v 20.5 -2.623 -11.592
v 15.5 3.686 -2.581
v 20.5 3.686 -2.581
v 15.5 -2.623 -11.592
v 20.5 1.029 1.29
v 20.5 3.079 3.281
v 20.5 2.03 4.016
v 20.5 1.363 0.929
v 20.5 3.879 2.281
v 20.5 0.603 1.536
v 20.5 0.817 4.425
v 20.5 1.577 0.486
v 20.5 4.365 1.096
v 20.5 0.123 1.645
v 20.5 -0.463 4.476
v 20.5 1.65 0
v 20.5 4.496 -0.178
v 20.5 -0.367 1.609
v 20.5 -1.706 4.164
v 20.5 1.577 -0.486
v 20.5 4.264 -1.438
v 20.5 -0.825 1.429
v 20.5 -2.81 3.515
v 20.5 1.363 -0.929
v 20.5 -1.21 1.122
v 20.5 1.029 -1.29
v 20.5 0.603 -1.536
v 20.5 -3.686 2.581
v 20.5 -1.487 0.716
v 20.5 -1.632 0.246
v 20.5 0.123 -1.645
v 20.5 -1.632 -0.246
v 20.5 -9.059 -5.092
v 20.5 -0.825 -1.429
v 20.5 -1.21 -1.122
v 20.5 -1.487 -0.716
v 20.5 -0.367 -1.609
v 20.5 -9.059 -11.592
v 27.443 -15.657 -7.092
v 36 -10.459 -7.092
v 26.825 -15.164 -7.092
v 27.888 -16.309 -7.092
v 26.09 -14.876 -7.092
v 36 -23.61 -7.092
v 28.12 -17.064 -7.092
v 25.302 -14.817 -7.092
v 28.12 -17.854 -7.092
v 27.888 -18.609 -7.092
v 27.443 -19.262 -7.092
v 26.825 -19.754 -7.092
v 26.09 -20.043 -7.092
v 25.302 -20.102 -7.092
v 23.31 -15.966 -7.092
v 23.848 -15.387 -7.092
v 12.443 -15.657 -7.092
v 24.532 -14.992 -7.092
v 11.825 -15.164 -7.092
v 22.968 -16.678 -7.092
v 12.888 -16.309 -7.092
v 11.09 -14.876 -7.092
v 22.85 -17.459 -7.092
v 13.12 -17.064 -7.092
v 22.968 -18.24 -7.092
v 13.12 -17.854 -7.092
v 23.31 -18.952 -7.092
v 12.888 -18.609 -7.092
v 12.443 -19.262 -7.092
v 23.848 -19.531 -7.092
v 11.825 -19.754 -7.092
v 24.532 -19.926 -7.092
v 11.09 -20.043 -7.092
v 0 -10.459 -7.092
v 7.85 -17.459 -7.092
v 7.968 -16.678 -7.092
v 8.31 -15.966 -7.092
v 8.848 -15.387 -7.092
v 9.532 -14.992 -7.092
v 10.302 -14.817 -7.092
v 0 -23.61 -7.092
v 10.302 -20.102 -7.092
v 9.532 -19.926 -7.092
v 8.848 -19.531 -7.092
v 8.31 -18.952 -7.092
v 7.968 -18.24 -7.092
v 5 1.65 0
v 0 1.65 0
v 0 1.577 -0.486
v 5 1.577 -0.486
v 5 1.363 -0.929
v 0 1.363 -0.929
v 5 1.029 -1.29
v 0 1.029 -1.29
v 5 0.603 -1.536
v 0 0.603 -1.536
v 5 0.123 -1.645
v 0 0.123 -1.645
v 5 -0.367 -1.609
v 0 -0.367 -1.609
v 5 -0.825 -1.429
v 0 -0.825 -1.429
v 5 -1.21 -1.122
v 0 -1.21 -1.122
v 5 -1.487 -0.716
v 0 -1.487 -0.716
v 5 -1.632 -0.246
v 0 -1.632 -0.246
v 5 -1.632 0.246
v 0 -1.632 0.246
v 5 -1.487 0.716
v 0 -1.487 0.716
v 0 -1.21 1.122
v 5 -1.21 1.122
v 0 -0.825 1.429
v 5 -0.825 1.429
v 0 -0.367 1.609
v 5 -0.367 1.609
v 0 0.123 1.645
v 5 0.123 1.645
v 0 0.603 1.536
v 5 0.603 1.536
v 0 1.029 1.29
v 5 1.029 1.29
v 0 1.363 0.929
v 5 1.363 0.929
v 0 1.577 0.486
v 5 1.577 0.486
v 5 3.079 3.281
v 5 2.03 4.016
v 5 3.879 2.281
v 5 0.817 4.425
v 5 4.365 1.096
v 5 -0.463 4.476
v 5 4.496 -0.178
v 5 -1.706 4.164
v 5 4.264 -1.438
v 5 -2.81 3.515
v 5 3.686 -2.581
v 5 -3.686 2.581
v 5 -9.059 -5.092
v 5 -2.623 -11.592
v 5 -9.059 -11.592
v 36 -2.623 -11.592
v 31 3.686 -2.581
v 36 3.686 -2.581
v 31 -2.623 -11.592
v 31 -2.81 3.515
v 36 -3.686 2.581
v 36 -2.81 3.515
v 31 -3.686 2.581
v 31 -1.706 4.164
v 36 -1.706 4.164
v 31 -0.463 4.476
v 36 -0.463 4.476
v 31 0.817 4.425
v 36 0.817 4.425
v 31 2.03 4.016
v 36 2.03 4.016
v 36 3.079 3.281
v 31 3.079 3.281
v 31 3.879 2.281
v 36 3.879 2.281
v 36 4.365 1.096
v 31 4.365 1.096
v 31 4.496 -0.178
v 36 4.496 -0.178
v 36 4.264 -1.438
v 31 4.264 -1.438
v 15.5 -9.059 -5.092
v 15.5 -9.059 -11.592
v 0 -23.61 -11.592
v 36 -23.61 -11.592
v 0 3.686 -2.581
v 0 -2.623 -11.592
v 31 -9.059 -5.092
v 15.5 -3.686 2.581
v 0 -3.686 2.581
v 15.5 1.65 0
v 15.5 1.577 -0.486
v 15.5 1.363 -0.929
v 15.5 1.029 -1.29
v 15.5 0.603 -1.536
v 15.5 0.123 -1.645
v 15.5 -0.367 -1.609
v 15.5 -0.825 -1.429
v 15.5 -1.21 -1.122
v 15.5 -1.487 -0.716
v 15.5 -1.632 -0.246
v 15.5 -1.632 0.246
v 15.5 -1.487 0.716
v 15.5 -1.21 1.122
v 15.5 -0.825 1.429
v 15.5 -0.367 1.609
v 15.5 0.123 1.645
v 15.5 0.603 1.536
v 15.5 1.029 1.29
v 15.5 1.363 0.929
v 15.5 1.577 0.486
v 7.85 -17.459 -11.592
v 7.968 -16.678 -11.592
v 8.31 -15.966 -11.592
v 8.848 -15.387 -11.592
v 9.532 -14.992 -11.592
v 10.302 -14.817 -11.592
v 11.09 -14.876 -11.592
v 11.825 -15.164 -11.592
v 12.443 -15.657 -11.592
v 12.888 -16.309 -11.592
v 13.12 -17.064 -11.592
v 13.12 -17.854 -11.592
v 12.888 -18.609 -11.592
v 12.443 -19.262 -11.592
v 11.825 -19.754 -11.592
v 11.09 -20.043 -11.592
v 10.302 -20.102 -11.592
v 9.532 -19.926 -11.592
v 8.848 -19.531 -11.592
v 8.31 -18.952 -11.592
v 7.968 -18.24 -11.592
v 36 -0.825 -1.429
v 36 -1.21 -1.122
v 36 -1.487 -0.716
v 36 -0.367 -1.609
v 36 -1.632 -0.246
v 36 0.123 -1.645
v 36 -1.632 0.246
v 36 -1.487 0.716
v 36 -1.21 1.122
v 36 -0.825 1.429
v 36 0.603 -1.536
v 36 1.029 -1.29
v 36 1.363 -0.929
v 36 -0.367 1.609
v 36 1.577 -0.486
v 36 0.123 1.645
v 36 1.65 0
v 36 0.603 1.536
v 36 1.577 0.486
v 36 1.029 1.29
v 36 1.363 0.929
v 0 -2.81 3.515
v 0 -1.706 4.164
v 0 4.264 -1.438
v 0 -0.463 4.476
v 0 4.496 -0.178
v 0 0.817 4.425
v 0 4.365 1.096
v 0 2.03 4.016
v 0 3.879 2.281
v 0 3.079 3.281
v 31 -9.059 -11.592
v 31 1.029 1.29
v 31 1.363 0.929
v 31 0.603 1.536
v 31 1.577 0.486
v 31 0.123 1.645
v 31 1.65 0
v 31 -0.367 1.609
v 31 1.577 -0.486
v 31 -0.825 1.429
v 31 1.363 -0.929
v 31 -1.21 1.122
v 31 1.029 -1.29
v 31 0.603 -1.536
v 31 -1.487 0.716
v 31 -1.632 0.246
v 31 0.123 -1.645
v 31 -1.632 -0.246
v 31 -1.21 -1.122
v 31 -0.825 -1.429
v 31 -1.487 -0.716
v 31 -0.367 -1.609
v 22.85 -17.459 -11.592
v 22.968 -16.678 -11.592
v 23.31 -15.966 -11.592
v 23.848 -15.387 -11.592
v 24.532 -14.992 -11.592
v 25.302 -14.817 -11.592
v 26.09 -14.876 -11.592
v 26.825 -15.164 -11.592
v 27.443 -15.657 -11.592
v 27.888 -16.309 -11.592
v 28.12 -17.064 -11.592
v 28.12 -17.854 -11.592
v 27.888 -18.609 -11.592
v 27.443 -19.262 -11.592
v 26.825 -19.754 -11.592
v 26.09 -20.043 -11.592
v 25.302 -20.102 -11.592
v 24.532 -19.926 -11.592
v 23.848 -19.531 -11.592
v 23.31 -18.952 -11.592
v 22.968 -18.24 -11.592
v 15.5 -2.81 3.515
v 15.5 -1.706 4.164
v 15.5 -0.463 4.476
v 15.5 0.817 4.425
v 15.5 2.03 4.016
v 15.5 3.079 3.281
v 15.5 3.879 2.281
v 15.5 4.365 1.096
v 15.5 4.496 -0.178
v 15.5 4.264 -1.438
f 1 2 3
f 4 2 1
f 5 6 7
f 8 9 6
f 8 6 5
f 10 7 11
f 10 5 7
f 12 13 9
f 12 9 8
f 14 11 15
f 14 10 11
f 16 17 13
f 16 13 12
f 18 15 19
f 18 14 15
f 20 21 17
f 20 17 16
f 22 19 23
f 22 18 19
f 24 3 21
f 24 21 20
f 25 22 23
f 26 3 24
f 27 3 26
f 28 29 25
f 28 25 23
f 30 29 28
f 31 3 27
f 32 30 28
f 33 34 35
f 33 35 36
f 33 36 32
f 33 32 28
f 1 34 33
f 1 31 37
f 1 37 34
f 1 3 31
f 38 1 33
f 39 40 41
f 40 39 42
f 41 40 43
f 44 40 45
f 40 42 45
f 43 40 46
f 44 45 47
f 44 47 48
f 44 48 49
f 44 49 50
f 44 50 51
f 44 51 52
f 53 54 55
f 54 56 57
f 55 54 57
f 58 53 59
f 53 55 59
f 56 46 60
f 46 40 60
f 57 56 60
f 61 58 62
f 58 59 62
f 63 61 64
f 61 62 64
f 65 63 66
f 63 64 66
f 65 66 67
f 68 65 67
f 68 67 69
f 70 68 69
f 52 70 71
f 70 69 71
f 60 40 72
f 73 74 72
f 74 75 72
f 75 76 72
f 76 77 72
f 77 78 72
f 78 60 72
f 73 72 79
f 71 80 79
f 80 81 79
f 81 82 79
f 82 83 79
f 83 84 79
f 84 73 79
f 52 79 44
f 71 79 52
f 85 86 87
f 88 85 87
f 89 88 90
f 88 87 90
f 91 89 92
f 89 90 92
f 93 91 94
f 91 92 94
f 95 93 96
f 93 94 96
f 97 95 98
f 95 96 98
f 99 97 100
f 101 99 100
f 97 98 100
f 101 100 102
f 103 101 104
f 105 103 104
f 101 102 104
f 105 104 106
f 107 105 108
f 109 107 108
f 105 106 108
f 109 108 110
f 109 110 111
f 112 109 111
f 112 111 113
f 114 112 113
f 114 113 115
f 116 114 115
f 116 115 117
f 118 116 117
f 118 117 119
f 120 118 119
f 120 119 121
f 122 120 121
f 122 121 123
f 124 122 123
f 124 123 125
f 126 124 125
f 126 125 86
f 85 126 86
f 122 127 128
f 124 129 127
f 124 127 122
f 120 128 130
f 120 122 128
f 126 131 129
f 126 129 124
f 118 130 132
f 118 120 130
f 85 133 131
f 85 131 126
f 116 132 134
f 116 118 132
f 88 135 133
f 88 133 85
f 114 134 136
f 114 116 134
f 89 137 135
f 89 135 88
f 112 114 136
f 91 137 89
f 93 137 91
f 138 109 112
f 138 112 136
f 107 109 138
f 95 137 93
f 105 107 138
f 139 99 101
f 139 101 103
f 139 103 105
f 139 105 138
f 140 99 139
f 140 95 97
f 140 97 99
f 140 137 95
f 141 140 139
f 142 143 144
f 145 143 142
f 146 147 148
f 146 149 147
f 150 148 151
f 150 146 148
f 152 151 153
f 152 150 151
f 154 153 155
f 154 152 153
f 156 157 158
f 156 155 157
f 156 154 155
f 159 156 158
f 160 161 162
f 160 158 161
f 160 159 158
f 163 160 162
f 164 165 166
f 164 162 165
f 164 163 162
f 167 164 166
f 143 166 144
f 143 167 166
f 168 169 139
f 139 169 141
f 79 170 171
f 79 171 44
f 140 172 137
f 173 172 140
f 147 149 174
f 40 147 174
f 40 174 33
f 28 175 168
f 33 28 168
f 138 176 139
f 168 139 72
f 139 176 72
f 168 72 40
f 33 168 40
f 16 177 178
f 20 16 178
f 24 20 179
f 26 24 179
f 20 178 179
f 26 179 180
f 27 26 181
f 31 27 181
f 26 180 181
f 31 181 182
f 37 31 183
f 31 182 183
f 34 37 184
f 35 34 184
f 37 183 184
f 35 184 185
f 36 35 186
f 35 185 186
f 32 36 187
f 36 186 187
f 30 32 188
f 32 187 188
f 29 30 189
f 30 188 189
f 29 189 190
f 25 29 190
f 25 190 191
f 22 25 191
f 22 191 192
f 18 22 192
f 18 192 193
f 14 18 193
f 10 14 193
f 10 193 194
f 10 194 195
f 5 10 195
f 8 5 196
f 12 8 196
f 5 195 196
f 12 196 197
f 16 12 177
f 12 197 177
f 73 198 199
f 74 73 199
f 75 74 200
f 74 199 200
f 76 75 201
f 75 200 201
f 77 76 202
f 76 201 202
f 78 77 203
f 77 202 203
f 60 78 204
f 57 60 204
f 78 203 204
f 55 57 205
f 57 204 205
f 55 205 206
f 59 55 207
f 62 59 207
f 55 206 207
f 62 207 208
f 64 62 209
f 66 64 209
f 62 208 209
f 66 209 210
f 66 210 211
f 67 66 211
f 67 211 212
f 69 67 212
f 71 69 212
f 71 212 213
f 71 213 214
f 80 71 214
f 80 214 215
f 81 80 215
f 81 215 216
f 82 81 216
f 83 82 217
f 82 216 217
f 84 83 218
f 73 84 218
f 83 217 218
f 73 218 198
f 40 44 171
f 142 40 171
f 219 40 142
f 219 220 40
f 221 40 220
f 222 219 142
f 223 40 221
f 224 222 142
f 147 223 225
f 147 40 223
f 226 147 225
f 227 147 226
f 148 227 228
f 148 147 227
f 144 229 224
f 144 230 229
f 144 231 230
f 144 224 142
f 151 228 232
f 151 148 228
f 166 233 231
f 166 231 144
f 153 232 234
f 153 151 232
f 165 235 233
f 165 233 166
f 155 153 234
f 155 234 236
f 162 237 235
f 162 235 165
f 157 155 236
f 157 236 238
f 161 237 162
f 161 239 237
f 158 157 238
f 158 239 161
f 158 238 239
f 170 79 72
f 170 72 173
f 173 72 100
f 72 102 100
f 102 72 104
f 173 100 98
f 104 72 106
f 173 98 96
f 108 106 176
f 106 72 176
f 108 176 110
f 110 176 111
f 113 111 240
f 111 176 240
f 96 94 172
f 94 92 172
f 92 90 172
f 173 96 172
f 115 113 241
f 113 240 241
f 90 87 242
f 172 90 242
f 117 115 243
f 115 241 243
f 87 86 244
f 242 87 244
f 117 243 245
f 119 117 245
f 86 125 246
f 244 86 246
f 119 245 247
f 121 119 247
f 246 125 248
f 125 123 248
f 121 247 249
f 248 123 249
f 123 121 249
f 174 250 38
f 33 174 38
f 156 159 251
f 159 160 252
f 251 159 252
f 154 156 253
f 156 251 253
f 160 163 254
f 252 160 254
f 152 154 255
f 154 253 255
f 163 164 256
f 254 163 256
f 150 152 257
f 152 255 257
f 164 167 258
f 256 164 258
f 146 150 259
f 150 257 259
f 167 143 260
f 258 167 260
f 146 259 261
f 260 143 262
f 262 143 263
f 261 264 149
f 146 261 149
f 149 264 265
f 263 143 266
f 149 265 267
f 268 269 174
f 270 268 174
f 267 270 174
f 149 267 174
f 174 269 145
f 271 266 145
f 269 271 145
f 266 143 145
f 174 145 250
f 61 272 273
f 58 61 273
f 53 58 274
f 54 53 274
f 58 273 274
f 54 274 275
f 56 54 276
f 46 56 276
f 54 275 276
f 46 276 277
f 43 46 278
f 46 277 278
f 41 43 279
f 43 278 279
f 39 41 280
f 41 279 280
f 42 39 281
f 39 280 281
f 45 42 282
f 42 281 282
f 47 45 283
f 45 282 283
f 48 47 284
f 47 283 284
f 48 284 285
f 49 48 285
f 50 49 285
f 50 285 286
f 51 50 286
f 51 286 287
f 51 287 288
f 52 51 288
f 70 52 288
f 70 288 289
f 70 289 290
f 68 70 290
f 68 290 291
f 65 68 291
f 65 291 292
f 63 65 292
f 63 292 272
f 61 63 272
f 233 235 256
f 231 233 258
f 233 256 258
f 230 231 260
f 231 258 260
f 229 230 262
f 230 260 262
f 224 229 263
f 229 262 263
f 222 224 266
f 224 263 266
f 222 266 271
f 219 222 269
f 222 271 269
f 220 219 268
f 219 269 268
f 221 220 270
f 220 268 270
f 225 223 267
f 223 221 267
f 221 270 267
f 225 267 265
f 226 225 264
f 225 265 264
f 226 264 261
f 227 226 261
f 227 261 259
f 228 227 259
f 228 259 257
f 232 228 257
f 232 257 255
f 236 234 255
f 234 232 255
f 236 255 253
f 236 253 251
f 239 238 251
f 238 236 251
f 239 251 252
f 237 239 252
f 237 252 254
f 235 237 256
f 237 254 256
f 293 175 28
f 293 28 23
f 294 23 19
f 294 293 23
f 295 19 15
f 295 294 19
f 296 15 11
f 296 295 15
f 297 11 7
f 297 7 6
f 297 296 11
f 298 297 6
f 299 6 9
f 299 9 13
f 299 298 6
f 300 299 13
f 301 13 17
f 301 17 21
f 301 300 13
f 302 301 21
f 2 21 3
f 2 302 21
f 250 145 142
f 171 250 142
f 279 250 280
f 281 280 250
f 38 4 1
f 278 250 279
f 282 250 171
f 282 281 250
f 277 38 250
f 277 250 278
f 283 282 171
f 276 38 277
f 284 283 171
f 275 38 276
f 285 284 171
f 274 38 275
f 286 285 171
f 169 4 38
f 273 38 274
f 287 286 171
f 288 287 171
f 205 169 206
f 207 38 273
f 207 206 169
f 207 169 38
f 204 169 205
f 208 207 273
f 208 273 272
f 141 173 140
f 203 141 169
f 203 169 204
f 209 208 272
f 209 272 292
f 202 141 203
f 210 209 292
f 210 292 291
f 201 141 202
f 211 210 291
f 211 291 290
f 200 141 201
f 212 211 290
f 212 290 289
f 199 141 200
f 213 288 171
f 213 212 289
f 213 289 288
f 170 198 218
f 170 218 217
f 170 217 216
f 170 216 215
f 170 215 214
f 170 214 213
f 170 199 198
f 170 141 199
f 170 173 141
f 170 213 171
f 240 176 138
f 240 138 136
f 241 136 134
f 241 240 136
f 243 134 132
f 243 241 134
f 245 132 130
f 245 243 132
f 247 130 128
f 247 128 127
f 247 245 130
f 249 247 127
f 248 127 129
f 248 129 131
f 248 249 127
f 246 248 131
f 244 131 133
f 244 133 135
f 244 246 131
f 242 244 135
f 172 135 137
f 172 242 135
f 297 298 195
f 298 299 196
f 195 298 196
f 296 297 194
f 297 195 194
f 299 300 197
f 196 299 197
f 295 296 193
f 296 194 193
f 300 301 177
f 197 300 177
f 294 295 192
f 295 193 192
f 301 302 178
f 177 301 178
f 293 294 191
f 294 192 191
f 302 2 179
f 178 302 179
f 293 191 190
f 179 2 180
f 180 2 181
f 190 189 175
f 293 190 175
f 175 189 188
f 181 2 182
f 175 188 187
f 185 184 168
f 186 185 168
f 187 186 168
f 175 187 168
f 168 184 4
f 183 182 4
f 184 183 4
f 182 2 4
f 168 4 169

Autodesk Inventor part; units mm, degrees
ref_plane "YZ Plane" through (0, 0, 0) normal (1, 0, 0) x (0, 1, 0)
ref_plane "XZ Plane" through (0, 0, 0) normal (0, 1, 0) x (-1, 0, 0)
ref_plane "XY Plane" through (0, 0, 0) normal (0, 0, 1) x (1, 0, 0)
sketch "스케치1" plane through (0, 0, 0) normal (1, 0, 0) x (0, 1, 0)
  circle A0 centre (0, 0) radius 1.65
  line L0 (-23.6101, -11.5918) -> (-23.6101, -7.0918)
  arc A1 (3.6862, -2.5811) -> (-3.6862, 2.5811) centre (0, 0) ccw
  line L1 (-3.6862, 2.5811) -> (-10.4592, -7.0918)
  line L2 (-10.4592, -7.0918) -> (-23.6101, -7.0918)
  line L3 (3.6862, -2.5811) -> (-2.6232, -11.5918)
  line L4 (-2.6232, -11.5918) -> (-23.6101, -11.5918)
  line L5 (-10.4592, -7.0918) -> (-9.0498, -7.0918)
  line L6 (-9.0498, -7.0918) -> (-9.0498, -11.5918)
  dimension "d5" = 4.5
extrude "돌출1" add sketch "스케치1" along normal blind 36 contours A0 | L0 L2 L5 L6 L4 | L6 L5 L1 A1 L3 L4
sketch "스케치4" plane through (0, -23.6101, -11.5918) normal (0, 0, -1) x (-1, 0, 0)
  line L0 (-36, 14.5515) -> (-31, 14.5515)
  line L1 (-31, 14.5515) -> (-30, 14.5515)
  line L2 (-30, 14.5515) -> (-21.5, 14.5515)
  line L3 (-21.5, 14.5515) -> (-20.5, 14.5515)
  line L4 (-20.5, 14.5515) -> (-15.5, 14.5515)
  line L5 (-15.5, 14.5515) -> (-14.5, 14.5515)
  line L6 (-14.5, 14.5515) -> (-6, 14.5515)
  line L7 (-6, 14.5515) -> (-5, 14.5515)
  line L8 (-5, 14.5515) -> (0, 14.5515)
  line L9 (-36, 14.5515) -> (-36, 28.1225)
  line L10 (-36, 28.1225) -> (-31, 28.1225)
  line L11 (-31, 28.1225) -> (-31, 14.5515)
  line L12 (-31, 14.5515) -> (-36, 14.5515)
  line L13 (-36, 19.9239) -> (-36, 13.1509) projected
  line L14 (-31, 28.1225) -> (-30, 28.1225)
  line L15 (-30, 28.1225) -> (-30, 14.5515)
  line L16 (-30, 14.5515) -> (-31, 14.5515)
  line L17 (-31, 14.5515) -> (-31, 28.1225)
  line L18 (-30, 28.1225) -> (-21.5, 28.1225)
  line L19 (-21.5, 28.1225) -> (-21.5, 14.5515)
  line L20 (-21.5, 14.5515) -> (-30, 14.5515)
  line L21 (-30, 14.5515) -> (-30, 28.1225)
  line L22 (-21.5, 28.1225) -> (-20.5, 28.1225)
  line L23 (-20.5, 28.1225) -> (-20.5, 14.5515)
  line L24 (-20.5, 14.5515) -> (-21.5, 14.5515)
  line L25 (-21.5, 14.5515) -> (-21.5, 28.1225)
  line L26 (-20.5, 28.1225) -> (-15.5, 28.1225)
  line L27 (-15.5, 28.1225) -> (-15.5, 14.5515)
  line L28 (-15.5, 14.5515) -> (-20.5, 14.5515)
  line L29 (-20.5, 14.5515) -> (-20.5, 28.1225)
  line L30 (-15.5, 28.1225) -> (-14.5, 28.1225)
  line L31 (-14.5, 28.1225) -> (-14.5, 14.5515)
  line L32 (-14.5, 14.5515) -> (-15.5, 14.5515)
  line L33 (-15.5, 14.5515) -> (-15.5, 28.1225)
  line L34 (-14.5, 28.1225) -> (-6, 28.1225)
  line L35 (-6, 28.1225) -> (-6, 14.5515)
  line L36 (-6, 14.5515) -> (-14.5, 14.5515)
  line L37 (-14.5, 14.5515) -> (-14.5, 28.1225)
  line L38 (-6, 28.1225) -> (-5, 28.1225)
  line L39 (-5, 28.1225) -> (-5, 14.5515)
  line L40 (-5, 14.5515) -> (-6, 14.5515)
  line L41 (-6, 14.5515) -> (-6, 28.1225)
  line L42 (-5, 28.1225) -> (0, 28.1225)
  line L43 (0, 28.1225) -> (0, 14.5515)
  line L44 (0, 14.5515) -> (-5, 14.5515)
  line L45 (-5, 14.5515) -> (-5, 28.1225)
  line L46 (-36, 13.1509) -> (-10.5, 13.1509)
  line L47 (0, 13.1509) -> (-36, 13.1509) projected
  line L48 (-18, 13.1509) -> (-18, 6.1509)
  line L49 (-18, 6.1509) -> (-25.5, 6.1509)
  line L50 (-18, 6.1509) -> (-10.5, 6.1509)
  circle A0 centre (-25.5, 6.1509) radius 2.65
  circle A1 centre (-10.5, 6.1509) radius 2.65
  dimension "d17" = 5
  dimension "d18" = 1
  dimension "d19" = 8.5
  dimension "d20" = 1
  dimension "d21" = 5
  dimension "d22" = 1
  dimension "d23" = 8.5
  dimension "d24" = 1
  dimension "d25" = 5
  dimension "d38" = 7
  dimension "d39" = 7.5
  dimension "d40" = 7.5
  dimension "d41" = 5.3
  dimension "d42" = 5.3
extrude "돌출2" cut sketch "스케치4" against normal blind 18 contours L11 L14 L15 L1 | L15 L18 L19 L2 | L19 L22 L23 L3 | L27 L30 L31 L5 | L31 L34 L35 L6 | L35 L38 L39 L7
extrude "돌출3" cut sketch "스케치1" along normal blind 36 contours A0
extrude "돌출6" cut sketch "스케치4" against normal blind 10 contours A0
extrude "돌출7" cut sketch "스케치4" against normal blind 10 contours A1
properties part number "xy 아이들러"
